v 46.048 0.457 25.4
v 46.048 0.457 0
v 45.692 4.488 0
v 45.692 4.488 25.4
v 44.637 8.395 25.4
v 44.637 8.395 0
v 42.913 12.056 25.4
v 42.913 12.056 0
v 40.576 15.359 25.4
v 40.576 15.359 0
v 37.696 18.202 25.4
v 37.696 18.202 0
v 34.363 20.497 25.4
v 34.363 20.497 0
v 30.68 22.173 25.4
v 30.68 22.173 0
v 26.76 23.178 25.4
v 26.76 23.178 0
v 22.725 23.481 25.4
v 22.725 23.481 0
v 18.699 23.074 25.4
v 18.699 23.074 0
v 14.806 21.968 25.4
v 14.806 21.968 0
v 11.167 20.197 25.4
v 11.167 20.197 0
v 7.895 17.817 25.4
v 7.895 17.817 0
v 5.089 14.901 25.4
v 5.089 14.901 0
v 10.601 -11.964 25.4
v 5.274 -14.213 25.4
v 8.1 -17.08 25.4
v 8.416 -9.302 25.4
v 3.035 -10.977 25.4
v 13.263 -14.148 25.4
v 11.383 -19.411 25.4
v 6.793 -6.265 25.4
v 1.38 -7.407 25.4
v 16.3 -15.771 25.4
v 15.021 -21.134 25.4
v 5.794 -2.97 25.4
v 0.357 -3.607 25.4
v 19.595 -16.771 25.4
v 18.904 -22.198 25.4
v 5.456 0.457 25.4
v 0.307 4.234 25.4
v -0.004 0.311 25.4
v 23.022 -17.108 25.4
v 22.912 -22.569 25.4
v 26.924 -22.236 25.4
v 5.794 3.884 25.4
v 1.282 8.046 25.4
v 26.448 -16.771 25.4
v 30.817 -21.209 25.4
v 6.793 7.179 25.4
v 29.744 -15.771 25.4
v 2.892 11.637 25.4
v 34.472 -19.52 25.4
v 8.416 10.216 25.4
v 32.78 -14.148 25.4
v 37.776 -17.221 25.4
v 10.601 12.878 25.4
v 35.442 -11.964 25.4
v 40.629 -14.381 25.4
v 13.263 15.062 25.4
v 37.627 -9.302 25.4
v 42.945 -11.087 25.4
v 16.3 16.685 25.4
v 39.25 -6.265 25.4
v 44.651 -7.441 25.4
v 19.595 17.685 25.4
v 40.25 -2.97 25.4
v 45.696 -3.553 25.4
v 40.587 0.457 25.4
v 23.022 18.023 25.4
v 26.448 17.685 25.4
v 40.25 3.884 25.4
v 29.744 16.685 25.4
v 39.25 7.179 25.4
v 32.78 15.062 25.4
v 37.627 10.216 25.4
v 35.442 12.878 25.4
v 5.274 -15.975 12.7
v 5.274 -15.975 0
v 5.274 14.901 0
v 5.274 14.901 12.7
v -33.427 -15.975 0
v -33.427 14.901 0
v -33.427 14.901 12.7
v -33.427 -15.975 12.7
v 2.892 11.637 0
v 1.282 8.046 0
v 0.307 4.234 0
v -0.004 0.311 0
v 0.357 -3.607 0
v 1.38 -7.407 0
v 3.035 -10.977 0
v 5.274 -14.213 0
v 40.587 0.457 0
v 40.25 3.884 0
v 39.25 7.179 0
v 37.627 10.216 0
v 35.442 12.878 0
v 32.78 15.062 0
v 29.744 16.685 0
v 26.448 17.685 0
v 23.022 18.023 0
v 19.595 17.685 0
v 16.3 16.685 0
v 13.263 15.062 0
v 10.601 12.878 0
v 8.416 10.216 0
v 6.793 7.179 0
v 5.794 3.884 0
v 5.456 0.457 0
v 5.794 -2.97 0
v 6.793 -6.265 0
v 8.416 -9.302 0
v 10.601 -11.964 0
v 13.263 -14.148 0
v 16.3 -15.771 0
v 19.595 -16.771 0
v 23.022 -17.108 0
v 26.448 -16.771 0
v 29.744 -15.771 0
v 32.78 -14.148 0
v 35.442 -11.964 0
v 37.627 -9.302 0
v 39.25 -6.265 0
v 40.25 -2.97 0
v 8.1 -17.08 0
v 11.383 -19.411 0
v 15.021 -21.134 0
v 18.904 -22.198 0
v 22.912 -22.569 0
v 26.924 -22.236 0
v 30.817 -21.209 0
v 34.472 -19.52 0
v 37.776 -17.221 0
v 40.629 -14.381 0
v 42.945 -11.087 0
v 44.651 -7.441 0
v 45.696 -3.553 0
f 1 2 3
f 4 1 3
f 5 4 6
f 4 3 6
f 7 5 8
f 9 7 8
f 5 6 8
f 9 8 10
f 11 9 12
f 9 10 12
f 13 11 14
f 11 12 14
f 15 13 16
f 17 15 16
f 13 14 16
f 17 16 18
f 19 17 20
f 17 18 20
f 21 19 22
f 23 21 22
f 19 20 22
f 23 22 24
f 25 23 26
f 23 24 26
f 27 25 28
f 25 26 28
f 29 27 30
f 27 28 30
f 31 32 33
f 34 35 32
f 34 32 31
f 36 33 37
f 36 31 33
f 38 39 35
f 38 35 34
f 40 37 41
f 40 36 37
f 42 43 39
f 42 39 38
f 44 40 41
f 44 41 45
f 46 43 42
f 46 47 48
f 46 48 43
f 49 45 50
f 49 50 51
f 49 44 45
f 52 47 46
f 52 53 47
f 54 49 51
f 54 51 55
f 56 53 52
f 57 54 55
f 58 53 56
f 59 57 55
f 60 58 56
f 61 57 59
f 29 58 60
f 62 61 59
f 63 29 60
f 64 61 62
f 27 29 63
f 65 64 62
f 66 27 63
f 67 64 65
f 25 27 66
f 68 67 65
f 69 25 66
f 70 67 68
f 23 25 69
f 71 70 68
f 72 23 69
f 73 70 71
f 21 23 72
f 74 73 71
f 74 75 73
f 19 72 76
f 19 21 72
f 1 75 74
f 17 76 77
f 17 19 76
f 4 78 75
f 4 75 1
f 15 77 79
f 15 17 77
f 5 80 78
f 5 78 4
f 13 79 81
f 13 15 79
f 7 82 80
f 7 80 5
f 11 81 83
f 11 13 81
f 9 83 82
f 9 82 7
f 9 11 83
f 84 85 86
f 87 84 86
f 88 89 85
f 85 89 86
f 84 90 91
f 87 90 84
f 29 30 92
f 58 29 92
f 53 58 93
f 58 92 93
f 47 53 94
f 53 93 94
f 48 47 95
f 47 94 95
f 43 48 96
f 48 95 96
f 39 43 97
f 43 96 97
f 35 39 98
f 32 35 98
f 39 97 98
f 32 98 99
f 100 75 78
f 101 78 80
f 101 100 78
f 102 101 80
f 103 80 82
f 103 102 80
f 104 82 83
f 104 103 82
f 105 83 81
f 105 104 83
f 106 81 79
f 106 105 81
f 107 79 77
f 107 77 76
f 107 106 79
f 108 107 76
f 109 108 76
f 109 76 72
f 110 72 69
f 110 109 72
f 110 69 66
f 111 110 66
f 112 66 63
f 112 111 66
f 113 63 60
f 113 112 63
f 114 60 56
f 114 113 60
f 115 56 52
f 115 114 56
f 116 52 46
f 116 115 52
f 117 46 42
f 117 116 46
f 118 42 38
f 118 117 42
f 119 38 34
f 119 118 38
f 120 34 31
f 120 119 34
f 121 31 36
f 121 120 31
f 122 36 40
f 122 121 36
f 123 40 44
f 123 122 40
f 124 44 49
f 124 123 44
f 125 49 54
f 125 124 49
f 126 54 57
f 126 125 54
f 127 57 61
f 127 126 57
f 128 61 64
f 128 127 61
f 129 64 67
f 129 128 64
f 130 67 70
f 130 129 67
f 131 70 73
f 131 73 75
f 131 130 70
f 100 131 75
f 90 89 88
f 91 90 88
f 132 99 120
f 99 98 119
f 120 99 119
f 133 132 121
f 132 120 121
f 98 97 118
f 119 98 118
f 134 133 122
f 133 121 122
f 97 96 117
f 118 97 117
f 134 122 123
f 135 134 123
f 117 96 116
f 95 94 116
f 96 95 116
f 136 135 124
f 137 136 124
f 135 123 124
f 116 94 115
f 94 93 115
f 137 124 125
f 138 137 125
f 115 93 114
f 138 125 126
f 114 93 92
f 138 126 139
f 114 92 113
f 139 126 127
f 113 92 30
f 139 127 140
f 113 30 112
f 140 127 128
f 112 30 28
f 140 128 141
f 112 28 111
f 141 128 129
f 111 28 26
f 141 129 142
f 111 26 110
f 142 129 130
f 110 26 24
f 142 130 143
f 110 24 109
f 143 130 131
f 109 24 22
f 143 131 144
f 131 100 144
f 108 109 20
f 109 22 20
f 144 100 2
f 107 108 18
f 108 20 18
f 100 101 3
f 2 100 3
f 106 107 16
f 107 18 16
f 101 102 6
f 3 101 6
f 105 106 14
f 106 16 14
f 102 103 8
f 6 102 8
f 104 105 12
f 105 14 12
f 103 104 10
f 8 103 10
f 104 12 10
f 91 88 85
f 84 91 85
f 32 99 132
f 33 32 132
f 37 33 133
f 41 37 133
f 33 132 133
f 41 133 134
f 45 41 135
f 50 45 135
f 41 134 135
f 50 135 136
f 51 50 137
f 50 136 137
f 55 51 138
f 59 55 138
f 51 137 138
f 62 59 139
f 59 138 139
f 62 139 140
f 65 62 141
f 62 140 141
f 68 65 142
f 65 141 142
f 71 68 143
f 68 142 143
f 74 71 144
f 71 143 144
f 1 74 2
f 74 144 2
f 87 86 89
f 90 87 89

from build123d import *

# Parameters (mm, degrees)
F1_DEPTH = 12.7
F0_R     = 17.565461
F2_DEPTH = 25.4


with BuildPart() as f1:
    # F0 (on Top) → F1 (new body)
    with BuildSketch(Plane.XY):
        with BuildLine():
            Line((5.089165, 14.901192), (-33.426996, 14.901192))
            Line((-33.426996, 14.901192), (-33.426996, -15.975151))
            Line((-33.426996, -15.975151), (5.273779, -15.975151))
            Line((5.273779, -15.975151), (5.273779, -14.2132))
            ThreePointArc((5.273779, -14.2132), (-0.004075, 0.311115), (5.089165, 14.901192))
        make_face()
        with BuildLine():
            Line((5.273779, 14.901192), (5.089165, 14.901192))
            ThreePointArc((5.089165, 14.901192), (-0.004075, 0.311115), (5.273779, -14.2132))
            Line((5.273779, -14.2132), (5.273779, 14.901192))
        make_face()
    extrude(amount=F1_DEPTH)


with BuildPart() as f2:
    # F0 (on Top) → F2 (new body)
    with BuildSketch(Plane.XY):
        with BuildLine():
            ThreePointArc((46.047813, 0.45712), (30.679591, 22.172564), (5.089165, 14.901192))
            Line((5.089165, 14.901192), (5.273779, 14.901192))
            Line((5.273779, 14.901192), (5.273779, -14.2132))
            ThreePointArc((5.273779, -14.2132), (30.817132, -21.209329), (46.047813, 0.45712))
        make_face()
        with Locations((23.021638, 0.45712)):
            Circle(F0_R, mode=Mode.SUBTRACT)
        with BuildLine():
            Line((5.273779, 14.901192), (5.089165, 14.901192))
            ThreePointArc((5.089165, 14.901192), (-0.004075, 0.311115), (5.273779, -14.2132))
            Line((5.273779, -14.2132), (5.273779, 14.901192))
        make_face()
    extrude(amount=F2_DEPTH)


solid = Compound([f1.part, f2.part])
